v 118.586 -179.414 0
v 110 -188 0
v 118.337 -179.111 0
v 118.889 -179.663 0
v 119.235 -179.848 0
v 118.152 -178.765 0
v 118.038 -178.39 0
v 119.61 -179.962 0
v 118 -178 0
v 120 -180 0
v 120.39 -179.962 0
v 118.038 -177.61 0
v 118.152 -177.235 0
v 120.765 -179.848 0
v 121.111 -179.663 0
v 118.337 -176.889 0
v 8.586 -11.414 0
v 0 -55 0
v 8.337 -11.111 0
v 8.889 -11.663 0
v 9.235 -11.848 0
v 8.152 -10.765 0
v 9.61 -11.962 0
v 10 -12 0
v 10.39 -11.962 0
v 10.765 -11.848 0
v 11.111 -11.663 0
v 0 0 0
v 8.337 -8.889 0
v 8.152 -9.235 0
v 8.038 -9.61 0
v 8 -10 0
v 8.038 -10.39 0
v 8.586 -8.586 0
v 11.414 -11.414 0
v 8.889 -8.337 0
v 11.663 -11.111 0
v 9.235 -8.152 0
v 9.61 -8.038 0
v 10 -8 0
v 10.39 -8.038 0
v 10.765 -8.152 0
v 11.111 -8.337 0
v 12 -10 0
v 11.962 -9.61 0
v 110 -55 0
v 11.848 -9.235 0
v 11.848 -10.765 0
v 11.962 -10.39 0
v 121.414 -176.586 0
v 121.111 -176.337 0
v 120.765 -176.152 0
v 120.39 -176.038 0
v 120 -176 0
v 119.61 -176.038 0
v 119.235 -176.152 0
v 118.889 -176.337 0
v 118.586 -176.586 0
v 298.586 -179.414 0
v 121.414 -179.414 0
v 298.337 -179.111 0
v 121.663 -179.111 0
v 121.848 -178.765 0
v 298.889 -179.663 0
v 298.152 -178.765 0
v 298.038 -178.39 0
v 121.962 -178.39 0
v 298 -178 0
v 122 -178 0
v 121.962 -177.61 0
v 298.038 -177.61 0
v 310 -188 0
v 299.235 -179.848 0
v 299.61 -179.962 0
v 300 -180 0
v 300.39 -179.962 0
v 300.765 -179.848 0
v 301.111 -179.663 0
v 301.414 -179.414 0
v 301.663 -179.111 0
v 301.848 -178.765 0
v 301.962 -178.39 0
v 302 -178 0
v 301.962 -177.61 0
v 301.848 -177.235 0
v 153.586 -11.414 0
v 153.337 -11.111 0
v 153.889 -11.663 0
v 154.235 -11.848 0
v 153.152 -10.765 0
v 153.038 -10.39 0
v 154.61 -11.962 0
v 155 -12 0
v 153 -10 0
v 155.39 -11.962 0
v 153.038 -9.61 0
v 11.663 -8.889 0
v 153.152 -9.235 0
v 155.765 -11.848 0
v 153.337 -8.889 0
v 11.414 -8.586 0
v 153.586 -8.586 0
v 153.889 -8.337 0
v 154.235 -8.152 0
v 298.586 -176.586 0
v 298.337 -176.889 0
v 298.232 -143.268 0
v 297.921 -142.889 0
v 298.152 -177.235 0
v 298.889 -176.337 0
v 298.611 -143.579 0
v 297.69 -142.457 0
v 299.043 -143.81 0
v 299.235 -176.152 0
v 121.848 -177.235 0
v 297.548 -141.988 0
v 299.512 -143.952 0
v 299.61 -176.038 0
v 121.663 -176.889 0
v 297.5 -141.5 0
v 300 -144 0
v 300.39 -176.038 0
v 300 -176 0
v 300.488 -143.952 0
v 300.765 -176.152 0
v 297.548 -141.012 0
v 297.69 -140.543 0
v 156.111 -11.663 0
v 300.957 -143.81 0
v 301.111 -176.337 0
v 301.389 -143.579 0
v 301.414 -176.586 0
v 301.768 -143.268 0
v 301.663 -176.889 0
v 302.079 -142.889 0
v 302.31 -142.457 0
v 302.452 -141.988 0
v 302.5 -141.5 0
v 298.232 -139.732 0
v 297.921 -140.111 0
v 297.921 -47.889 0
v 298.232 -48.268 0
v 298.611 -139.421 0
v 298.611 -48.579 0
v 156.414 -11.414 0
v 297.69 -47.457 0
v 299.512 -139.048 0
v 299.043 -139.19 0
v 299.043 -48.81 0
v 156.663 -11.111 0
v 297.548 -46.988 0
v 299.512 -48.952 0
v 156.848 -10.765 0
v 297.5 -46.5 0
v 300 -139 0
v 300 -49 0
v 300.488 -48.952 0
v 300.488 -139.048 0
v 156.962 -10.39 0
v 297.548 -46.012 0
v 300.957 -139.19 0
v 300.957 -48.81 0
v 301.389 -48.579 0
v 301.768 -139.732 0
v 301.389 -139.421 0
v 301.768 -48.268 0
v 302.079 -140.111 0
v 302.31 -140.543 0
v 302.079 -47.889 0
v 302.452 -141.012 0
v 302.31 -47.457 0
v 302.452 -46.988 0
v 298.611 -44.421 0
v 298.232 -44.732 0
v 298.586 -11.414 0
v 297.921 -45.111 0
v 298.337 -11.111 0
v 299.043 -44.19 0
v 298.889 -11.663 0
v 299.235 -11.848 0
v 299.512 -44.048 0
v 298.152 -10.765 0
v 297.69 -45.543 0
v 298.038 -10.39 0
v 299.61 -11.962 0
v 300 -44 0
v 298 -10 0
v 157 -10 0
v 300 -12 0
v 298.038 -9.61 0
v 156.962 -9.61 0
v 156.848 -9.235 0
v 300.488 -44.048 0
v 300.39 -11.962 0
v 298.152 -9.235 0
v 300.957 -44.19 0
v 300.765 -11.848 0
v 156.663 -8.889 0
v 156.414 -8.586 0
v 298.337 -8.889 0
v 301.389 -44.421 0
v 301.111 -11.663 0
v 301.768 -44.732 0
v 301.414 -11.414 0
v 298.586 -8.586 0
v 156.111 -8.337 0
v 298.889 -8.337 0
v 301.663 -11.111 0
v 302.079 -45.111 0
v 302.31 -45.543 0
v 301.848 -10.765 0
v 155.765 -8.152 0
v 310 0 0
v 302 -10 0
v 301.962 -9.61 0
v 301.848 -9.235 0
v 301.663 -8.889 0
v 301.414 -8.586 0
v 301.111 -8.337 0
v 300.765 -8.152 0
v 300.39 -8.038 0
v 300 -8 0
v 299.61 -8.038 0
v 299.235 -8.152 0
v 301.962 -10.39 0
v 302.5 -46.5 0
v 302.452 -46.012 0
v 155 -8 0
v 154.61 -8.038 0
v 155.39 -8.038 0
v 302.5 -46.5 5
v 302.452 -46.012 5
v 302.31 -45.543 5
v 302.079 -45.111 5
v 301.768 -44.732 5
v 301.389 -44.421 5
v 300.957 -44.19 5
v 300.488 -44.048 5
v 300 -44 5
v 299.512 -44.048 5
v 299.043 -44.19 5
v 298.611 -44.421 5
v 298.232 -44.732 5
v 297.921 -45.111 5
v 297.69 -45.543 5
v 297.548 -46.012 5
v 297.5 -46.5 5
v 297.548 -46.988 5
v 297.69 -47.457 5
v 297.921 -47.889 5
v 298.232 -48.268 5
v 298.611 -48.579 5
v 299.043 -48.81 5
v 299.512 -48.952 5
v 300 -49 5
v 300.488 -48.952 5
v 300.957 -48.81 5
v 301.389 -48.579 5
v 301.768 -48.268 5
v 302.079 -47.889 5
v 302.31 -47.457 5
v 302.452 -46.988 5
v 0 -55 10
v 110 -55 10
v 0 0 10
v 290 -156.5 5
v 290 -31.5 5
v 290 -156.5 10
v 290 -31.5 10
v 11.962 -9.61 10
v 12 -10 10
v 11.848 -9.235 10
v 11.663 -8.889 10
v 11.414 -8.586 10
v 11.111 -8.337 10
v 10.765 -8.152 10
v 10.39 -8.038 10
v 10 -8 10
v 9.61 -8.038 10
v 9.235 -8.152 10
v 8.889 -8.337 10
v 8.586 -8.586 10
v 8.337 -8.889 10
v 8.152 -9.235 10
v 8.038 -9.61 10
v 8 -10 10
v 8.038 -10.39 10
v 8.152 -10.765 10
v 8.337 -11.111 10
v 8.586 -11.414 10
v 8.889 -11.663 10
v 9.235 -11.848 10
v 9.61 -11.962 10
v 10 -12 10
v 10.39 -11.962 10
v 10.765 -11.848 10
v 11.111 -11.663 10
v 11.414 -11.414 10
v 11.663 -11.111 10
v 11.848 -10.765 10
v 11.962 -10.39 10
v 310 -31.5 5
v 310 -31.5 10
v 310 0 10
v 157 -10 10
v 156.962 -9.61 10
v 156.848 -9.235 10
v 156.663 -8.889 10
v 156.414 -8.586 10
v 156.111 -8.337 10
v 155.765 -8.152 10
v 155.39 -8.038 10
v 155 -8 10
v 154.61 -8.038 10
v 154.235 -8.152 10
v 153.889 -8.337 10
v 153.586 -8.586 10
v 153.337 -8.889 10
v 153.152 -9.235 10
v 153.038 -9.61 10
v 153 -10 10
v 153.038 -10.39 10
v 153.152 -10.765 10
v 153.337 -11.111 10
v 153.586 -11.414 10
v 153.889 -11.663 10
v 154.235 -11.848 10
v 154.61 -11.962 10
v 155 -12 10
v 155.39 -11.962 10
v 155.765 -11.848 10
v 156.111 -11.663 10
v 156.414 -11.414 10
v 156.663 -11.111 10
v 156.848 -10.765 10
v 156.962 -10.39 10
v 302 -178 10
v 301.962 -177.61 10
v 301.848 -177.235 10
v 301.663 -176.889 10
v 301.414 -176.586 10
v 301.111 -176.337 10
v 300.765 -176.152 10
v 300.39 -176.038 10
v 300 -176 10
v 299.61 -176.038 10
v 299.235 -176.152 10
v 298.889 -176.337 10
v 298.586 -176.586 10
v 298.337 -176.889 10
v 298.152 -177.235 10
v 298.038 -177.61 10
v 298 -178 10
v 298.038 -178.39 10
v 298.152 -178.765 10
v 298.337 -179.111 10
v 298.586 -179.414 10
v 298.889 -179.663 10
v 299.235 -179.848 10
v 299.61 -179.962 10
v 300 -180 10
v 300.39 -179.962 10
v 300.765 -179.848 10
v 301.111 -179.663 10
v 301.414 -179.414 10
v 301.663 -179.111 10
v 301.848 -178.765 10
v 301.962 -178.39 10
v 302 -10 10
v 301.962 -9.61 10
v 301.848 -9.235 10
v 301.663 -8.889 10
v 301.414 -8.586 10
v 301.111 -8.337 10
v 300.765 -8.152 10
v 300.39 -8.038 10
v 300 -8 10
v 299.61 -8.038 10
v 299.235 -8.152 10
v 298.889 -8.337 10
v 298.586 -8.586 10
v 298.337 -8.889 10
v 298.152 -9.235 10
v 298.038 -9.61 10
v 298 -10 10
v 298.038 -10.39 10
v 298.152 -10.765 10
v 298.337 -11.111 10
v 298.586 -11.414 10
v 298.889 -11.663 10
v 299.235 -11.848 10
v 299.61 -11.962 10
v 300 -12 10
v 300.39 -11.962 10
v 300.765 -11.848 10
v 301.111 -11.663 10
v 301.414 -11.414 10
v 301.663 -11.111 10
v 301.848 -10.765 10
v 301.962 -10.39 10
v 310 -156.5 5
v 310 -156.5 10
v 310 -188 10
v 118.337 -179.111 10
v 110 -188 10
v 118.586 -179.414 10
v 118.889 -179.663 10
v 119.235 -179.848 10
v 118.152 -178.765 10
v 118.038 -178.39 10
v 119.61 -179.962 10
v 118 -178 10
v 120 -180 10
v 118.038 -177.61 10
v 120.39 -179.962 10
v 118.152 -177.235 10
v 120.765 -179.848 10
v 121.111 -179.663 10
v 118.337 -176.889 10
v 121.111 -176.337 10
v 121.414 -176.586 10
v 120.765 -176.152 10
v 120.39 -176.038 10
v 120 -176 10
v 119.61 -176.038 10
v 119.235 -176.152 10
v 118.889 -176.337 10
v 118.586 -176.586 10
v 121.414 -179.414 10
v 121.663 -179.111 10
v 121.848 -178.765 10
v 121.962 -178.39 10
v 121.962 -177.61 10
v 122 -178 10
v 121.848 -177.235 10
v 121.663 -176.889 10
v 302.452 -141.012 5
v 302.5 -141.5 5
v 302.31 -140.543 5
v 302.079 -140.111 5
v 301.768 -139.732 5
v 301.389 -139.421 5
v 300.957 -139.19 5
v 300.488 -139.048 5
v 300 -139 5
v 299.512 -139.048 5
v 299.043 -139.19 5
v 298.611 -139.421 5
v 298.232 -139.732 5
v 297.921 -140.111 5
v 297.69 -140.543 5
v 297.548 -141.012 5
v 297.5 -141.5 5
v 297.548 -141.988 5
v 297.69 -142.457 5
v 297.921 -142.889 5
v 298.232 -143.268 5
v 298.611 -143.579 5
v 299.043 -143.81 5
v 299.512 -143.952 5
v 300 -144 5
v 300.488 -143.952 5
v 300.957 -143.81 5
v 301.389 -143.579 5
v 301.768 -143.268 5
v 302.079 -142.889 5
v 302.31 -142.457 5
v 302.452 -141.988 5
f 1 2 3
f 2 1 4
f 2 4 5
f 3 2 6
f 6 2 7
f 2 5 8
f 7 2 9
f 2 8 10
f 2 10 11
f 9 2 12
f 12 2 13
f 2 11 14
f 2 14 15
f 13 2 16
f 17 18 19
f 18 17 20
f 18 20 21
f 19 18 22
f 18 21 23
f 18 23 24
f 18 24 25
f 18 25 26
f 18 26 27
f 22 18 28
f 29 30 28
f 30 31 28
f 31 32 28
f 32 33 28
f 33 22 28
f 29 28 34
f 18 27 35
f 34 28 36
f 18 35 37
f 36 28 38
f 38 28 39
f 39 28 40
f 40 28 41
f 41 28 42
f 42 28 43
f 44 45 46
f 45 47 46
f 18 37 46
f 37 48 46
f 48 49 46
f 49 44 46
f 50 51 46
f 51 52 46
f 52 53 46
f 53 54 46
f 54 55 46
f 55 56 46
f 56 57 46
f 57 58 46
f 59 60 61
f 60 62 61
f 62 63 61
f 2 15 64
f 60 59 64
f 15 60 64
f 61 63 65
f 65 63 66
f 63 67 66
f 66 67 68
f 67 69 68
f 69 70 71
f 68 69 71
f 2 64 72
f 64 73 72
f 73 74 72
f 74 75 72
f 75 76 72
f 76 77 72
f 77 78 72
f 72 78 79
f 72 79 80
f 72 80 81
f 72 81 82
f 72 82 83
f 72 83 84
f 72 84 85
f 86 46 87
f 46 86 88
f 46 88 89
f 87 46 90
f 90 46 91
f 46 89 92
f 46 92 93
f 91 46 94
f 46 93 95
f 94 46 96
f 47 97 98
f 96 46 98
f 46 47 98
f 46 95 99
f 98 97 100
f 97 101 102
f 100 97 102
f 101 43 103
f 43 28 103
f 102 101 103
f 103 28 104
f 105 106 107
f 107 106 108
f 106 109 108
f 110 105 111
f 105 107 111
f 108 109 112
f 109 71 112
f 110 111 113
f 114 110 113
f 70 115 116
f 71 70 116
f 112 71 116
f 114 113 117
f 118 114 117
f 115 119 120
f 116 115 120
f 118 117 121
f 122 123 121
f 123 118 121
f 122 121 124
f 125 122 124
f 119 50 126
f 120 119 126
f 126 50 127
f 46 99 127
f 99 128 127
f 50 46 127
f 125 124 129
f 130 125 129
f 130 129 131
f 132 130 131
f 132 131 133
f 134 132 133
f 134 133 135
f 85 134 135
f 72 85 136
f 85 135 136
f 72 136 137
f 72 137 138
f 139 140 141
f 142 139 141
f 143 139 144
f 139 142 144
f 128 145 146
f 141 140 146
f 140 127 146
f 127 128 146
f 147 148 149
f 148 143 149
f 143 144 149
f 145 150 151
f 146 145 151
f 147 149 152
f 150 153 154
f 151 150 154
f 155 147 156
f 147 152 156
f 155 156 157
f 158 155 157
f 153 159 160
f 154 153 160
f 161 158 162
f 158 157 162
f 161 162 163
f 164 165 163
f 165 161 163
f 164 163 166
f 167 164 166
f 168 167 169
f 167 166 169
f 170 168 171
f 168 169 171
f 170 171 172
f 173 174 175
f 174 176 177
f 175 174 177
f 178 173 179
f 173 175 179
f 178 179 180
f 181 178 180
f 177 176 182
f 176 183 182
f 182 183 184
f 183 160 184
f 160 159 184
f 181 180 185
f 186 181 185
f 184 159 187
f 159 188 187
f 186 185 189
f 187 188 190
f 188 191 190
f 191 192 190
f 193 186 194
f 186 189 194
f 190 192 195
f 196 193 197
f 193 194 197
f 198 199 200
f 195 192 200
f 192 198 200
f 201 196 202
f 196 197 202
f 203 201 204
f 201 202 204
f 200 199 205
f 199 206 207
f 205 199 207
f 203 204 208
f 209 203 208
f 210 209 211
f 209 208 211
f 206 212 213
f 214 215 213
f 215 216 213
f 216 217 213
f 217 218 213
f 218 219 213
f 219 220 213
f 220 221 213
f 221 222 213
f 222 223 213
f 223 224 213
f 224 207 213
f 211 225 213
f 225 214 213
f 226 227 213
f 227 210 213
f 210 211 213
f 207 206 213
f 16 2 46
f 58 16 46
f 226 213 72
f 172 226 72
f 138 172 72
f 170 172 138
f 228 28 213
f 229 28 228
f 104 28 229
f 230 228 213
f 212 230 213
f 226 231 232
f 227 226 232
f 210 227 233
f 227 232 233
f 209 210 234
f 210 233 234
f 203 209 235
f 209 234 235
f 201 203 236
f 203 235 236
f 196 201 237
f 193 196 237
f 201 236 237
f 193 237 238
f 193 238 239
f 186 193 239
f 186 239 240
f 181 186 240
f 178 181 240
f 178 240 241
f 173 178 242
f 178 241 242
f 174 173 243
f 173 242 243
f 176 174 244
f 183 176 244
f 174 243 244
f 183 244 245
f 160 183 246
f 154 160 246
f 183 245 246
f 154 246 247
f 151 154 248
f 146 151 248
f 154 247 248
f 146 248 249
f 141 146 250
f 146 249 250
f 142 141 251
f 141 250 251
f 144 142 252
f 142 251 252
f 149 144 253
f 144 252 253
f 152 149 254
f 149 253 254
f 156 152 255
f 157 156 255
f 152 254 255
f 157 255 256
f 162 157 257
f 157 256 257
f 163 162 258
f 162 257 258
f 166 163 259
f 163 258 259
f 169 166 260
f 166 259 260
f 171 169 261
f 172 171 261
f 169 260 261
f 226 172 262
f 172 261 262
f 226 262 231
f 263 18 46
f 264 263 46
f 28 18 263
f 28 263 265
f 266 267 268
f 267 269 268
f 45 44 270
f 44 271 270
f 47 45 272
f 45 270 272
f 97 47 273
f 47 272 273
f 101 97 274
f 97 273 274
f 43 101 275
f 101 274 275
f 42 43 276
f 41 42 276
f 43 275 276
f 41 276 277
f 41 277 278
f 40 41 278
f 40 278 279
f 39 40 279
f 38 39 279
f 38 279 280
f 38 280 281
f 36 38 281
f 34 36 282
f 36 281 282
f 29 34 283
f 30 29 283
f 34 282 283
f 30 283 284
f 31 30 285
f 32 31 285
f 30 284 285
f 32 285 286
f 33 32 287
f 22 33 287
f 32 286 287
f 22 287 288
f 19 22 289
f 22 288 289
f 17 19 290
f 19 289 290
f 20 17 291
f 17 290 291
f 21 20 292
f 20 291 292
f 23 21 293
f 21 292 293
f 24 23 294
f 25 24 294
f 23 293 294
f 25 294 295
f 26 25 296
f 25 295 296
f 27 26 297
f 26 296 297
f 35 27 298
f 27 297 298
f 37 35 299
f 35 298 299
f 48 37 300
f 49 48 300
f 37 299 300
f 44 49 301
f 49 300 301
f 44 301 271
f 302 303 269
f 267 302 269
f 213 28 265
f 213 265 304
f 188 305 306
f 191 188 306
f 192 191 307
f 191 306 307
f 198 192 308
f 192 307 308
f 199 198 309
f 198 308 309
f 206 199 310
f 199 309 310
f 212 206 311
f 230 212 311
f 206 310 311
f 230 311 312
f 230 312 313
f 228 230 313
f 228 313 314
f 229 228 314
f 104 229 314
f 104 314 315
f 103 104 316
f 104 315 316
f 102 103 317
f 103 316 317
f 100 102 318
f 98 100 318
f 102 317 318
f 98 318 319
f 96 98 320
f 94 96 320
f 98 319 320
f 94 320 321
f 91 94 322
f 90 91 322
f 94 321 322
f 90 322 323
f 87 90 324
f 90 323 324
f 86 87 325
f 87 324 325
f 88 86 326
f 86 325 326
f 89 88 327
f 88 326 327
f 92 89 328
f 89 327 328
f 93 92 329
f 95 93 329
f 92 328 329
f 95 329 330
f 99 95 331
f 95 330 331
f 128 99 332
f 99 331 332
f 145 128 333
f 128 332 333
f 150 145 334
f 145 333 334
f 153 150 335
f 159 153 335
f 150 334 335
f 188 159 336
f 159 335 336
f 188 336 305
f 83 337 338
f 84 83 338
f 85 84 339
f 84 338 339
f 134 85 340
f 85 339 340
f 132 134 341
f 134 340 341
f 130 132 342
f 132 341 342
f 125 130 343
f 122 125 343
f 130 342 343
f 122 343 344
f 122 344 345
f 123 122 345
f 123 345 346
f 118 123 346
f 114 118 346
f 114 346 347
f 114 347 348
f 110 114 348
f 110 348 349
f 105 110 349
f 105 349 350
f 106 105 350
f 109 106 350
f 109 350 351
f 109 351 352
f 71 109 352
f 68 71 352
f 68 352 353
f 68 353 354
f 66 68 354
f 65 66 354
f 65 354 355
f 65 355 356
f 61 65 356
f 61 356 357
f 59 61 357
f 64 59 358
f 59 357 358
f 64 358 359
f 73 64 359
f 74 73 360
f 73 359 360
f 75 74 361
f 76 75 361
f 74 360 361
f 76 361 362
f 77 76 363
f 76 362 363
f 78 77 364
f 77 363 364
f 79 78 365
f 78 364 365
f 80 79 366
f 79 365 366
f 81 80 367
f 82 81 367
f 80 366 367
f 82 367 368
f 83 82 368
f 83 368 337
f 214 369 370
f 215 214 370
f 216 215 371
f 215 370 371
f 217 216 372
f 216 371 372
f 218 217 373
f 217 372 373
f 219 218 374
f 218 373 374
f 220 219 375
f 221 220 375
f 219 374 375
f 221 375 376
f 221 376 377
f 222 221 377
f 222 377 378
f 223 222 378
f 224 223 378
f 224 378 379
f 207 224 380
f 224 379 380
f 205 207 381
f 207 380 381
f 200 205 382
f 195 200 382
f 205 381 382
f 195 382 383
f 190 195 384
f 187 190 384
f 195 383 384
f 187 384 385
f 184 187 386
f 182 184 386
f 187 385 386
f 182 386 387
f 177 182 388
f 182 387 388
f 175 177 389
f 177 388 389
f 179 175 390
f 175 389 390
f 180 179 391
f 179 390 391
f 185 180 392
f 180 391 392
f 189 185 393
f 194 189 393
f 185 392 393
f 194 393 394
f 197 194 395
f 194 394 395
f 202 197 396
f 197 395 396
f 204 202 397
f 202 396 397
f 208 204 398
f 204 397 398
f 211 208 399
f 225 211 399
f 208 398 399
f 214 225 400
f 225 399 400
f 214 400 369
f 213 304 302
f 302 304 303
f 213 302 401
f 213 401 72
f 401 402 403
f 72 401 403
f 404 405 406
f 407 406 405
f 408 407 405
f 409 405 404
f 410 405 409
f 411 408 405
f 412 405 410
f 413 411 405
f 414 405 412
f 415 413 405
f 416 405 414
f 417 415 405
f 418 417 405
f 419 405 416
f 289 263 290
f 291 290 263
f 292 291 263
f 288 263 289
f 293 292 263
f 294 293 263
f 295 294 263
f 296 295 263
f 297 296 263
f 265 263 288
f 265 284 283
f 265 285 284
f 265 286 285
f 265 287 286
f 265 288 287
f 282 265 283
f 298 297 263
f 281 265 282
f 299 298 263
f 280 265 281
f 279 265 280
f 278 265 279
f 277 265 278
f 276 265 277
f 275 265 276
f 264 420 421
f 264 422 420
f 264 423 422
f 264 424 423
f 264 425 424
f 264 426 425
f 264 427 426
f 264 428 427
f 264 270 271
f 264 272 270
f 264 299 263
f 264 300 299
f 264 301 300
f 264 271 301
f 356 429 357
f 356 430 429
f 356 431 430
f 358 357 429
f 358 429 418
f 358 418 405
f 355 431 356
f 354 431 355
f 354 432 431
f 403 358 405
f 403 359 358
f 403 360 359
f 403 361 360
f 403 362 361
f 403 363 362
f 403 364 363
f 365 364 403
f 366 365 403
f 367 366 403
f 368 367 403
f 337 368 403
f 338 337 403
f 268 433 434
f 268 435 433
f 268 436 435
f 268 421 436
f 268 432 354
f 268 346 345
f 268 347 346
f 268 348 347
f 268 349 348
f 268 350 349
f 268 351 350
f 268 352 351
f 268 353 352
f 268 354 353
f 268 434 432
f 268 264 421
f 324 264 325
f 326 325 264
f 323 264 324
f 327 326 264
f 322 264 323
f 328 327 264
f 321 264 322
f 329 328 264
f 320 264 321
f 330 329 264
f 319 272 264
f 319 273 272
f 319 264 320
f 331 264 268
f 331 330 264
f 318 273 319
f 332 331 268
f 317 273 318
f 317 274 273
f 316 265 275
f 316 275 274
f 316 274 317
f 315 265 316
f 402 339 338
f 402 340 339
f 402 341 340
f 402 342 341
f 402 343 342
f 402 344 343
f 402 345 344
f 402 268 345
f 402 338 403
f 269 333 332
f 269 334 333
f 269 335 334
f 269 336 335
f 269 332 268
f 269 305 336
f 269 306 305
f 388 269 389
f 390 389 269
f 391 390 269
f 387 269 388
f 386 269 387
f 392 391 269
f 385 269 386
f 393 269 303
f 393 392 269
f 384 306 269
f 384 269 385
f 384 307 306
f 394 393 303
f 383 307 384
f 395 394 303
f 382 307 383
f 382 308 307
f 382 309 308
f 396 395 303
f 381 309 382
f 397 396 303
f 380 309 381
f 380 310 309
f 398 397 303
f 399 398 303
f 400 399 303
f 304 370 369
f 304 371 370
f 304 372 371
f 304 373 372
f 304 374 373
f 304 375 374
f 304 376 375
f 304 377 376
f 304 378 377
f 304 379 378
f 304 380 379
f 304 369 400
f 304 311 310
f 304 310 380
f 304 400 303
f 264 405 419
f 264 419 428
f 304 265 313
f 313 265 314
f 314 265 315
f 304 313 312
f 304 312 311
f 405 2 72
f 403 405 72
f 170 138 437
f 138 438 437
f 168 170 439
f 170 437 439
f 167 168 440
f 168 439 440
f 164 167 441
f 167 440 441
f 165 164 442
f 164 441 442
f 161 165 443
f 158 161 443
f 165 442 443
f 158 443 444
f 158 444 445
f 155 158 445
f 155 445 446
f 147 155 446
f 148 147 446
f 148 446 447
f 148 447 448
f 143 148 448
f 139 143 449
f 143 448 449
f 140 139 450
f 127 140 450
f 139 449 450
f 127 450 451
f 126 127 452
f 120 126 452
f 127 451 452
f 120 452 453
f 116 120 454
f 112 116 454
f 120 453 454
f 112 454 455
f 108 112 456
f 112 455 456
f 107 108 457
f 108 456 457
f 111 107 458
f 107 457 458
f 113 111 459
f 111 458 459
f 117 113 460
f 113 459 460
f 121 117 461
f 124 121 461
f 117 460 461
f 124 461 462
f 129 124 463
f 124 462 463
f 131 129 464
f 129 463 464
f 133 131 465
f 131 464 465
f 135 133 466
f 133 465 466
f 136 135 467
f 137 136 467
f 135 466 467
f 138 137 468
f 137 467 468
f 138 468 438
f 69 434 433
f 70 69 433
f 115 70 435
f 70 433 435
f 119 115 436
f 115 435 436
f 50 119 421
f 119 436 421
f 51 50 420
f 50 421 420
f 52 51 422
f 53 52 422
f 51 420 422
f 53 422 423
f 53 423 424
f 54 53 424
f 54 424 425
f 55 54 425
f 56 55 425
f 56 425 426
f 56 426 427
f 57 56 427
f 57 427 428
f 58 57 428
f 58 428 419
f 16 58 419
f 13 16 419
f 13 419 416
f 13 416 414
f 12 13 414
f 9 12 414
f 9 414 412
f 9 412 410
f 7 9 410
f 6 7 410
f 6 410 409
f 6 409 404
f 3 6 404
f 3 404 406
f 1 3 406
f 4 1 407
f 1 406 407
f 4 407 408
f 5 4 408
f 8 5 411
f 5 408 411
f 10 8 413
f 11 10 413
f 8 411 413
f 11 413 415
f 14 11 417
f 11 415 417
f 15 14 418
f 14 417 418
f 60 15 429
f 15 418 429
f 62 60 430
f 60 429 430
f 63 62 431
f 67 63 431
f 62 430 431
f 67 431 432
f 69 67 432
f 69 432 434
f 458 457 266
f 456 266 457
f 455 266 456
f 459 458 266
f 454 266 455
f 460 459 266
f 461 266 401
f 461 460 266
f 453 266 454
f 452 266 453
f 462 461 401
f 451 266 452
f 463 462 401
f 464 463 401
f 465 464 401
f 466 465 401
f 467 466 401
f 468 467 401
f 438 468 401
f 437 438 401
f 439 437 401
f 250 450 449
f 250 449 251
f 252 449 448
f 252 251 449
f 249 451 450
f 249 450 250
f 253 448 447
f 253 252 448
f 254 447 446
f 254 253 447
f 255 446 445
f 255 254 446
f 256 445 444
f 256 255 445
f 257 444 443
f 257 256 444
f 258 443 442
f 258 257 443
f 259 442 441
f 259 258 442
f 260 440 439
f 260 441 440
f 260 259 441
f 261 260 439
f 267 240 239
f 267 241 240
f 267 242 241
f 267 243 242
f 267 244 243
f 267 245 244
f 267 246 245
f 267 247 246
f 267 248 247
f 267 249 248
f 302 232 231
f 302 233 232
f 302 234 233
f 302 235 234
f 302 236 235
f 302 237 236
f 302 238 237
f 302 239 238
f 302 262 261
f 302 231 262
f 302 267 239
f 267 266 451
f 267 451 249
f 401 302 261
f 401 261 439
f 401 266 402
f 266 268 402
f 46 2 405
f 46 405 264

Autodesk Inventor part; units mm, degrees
ref_plane "YZ Plane" through (0, 0, 0) normal (1, 0, 0) x (0, 1, 0)
ref_plane "XZ Plane" through (0, 0, 0) normal (0, 1, 0) x (-1, 0, 0)
ref_plane "XY Plane" through (0, 0, 0) normal (0, 0, 1) x (1, 0, 0)
sketch "Sketch1" plane through (0, 0, 0) normal (0, 0, 1) x (1, 0, 0)
  line L0 (0, 0) -> (620, 0)
  line L1 (110, -188) -> (510, -188)
  line L2 (510, -188) -> (510, -55)
  line L3 (510, -55) -> (620, -55)
  line L4 (620, -55) -> (620, 0)
  line L5 (110, -188) -> (110, -55)
  line L6 (0, -55) -> (0, 0)
  line L7 (0, -55) -> (110, -55)
  point P0 (310, -188)
  point P1 (310, 0)
  dimension "d0" = 620
  dimension "d1" = 188
  dimension "d2" = 400
  dimension "d3" = 133
extrude "Extrusion1" add sketch "Sketch1" along normal blind 10
sketch "Sketch2" plane through (0, 0, 10) normal (0, 0, 1) x (1, 0, 0)
  line L0 (620, 0) -> (0, 0) projected
  line L1 (510, -188) -> (110, -188) projected
  line L2 (620, 0) -> (310, 0)
  line L3 (310, 0) -> (310, -188)
  line L4 (310, -188) -> (620, -188)
  line L5 (620, -188) -> (620, 0)
extrude "Extrusion2" cut sketch "Sketch2" against normal through all
sketch "Sketch3" plane through (0, 0, 10) normal (0, 0, 1) x (1, 0, 0)
  circle A0 centre (10, -10) radius 2
  line L0 (310, 0) -> (0, 0) projected
  line L1 (0, 0) -> (0, -55) projected
  circle A1 centre (155, -10) radius 2
  circle A2 centre (300, -10) radius 2
  line L2 (310, -188) -> (310, 0) projected
  line L3 (10, -10) -> (300, -10) construction
  circle A3 centre (120, -178) radius 2
  line L4 (110, -55) -> (110, -188) projected
  line L5 (110, -188) -> (310, -188) projected
  circle A4 centre (300, -178) radius 2
  dimension "d8" = 4
  dimension "d9" = 10
  dimension "d10" = 10
  dimension "d11" = 4
  dimension "d12" = 4
  dimension "d13" = 10
  dimension "d14" = 4
  dimension "d15" = 10
  dimension "d16" = 10
  dimension "d17" = 4
  dimension "d18" = 10
  dimension "d19" = 10
extrude "Extrusion3" cut sketch "Sketch3" against normal through all
sketch "Sketch6" plane through (0, 0, 10) normal (0, 0, 1) x (1, 0, 0)
  line L0 (310, -31.5) -> (290, -31.5)
  line L1 (290, -31.5) -> (290, -156.5)
  line L2 (290, -156.5) -> (310, -156.5)
  line L3 (310, -156.5) -> (310, -31.5)
  line L4 (310, -188) -> (310, 0) projected
  point P0 (0, 0)
  point P1 (310, -94)
  dimension "d42" = 20
  dimension "d43" = 125
extrude "Extrusion6" cut sketch "Sketch6" against normal blind 5
sketch "Sketch7" plane through (0, 0, 5) normal (0, 0, 1) x (1, 0, 0)
  line L0 (300, -46.5) -> (300, -141.5) construction
  circle A0 centre (300, -46.5) radius 2.5
  circle A1 centre (300, -141.5) radius 2.5
  line L1 (310, -31.5) -> (310, -156.5) projected
  point P0 (0, 0)
  point P1 (300, -94)
  point P2 (310, -94)
  dimension "d46" = 5
  dimension "d47" = 5
  dimension "d48" = 10
  dimension "d49" = 95
extrude "Extrusion7" cut sketch "Sketch7" against normal through all
properties part number "SP001b" material "ABS Plastic"
